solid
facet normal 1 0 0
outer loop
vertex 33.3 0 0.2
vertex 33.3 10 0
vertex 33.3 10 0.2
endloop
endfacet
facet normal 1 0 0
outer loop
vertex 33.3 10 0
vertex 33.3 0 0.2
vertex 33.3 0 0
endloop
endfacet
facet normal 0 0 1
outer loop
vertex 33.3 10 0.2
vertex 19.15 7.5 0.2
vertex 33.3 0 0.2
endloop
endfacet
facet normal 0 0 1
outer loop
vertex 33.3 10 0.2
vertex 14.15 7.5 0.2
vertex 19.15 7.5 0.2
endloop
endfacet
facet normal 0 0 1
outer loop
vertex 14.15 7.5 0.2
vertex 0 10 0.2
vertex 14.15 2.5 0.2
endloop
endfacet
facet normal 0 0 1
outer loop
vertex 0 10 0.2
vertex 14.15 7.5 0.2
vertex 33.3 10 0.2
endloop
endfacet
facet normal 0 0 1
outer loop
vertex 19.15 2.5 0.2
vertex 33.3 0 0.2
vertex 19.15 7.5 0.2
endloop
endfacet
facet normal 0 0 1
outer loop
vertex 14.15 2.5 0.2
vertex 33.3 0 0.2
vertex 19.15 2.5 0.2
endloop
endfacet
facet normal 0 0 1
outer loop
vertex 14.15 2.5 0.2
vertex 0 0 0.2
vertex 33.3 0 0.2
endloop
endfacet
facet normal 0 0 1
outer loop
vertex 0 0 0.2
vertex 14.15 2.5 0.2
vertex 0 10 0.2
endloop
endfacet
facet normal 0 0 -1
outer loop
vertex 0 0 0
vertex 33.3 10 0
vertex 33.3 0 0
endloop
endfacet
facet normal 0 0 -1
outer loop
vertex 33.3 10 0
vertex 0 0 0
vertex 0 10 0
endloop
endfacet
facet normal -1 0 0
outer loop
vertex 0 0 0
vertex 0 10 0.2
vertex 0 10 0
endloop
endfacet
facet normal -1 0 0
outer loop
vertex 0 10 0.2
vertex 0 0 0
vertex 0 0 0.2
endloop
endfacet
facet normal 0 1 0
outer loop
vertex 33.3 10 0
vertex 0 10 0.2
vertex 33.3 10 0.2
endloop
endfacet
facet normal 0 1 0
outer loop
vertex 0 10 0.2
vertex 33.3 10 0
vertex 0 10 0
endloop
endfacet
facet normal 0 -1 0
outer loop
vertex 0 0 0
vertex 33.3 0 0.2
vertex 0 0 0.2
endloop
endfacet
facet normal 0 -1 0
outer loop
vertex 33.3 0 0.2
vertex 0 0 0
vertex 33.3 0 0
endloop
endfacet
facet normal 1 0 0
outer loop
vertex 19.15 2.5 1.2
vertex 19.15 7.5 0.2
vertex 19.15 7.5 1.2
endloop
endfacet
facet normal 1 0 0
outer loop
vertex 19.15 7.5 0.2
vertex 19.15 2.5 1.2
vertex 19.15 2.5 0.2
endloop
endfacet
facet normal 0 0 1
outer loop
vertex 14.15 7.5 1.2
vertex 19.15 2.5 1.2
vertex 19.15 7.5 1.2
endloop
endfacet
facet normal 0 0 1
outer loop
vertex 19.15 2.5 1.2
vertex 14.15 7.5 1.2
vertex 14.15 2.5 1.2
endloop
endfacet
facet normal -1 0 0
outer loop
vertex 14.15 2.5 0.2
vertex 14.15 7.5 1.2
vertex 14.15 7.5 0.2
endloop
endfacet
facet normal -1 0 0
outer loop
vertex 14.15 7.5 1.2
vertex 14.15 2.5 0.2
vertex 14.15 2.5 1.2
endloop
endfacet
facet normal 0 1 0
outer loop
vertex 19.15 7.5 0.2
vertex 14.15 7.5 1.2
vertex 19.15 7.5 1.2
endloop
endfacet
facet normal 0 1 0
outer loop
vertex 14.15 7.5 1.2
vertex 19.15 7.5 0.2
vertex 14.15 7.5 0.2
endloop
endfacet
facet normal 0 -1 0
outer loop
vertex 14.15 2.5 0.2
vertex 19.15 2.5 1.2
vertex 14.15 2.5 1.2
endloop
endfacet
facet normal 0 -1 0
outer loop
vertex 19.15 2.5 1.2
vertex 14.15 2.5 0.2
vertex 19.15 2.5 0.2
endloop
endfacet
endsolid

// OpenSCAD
// file: led_ADA1376_dimensions.scad
// ADA1376 led strip dimensions
led_height = 0.2;
led_width = 10;
// 30 LEDs/m strip is 33.3 but can be adapted to reduce overall board footprint
led_interval = 33.3;
// main file
include<led_ADA1376_dimensions.scad>;

module LED_ADA1376() {

    white = [0.9, 0.9, 0.9];

    module strip() {
        color(white) {
            cube([led_interval, led_width, led_height]);
        }
    }

    module led() {
        color([0.8, 0.8, 0.8]) {
                cube([5, 5, 1]);
        }
    }

    strip();
    translate([(led_interval - 5)/2, (led_width - 5)/2, led_height])
        led();
}

// Example usage:
LED_ADA1376();
